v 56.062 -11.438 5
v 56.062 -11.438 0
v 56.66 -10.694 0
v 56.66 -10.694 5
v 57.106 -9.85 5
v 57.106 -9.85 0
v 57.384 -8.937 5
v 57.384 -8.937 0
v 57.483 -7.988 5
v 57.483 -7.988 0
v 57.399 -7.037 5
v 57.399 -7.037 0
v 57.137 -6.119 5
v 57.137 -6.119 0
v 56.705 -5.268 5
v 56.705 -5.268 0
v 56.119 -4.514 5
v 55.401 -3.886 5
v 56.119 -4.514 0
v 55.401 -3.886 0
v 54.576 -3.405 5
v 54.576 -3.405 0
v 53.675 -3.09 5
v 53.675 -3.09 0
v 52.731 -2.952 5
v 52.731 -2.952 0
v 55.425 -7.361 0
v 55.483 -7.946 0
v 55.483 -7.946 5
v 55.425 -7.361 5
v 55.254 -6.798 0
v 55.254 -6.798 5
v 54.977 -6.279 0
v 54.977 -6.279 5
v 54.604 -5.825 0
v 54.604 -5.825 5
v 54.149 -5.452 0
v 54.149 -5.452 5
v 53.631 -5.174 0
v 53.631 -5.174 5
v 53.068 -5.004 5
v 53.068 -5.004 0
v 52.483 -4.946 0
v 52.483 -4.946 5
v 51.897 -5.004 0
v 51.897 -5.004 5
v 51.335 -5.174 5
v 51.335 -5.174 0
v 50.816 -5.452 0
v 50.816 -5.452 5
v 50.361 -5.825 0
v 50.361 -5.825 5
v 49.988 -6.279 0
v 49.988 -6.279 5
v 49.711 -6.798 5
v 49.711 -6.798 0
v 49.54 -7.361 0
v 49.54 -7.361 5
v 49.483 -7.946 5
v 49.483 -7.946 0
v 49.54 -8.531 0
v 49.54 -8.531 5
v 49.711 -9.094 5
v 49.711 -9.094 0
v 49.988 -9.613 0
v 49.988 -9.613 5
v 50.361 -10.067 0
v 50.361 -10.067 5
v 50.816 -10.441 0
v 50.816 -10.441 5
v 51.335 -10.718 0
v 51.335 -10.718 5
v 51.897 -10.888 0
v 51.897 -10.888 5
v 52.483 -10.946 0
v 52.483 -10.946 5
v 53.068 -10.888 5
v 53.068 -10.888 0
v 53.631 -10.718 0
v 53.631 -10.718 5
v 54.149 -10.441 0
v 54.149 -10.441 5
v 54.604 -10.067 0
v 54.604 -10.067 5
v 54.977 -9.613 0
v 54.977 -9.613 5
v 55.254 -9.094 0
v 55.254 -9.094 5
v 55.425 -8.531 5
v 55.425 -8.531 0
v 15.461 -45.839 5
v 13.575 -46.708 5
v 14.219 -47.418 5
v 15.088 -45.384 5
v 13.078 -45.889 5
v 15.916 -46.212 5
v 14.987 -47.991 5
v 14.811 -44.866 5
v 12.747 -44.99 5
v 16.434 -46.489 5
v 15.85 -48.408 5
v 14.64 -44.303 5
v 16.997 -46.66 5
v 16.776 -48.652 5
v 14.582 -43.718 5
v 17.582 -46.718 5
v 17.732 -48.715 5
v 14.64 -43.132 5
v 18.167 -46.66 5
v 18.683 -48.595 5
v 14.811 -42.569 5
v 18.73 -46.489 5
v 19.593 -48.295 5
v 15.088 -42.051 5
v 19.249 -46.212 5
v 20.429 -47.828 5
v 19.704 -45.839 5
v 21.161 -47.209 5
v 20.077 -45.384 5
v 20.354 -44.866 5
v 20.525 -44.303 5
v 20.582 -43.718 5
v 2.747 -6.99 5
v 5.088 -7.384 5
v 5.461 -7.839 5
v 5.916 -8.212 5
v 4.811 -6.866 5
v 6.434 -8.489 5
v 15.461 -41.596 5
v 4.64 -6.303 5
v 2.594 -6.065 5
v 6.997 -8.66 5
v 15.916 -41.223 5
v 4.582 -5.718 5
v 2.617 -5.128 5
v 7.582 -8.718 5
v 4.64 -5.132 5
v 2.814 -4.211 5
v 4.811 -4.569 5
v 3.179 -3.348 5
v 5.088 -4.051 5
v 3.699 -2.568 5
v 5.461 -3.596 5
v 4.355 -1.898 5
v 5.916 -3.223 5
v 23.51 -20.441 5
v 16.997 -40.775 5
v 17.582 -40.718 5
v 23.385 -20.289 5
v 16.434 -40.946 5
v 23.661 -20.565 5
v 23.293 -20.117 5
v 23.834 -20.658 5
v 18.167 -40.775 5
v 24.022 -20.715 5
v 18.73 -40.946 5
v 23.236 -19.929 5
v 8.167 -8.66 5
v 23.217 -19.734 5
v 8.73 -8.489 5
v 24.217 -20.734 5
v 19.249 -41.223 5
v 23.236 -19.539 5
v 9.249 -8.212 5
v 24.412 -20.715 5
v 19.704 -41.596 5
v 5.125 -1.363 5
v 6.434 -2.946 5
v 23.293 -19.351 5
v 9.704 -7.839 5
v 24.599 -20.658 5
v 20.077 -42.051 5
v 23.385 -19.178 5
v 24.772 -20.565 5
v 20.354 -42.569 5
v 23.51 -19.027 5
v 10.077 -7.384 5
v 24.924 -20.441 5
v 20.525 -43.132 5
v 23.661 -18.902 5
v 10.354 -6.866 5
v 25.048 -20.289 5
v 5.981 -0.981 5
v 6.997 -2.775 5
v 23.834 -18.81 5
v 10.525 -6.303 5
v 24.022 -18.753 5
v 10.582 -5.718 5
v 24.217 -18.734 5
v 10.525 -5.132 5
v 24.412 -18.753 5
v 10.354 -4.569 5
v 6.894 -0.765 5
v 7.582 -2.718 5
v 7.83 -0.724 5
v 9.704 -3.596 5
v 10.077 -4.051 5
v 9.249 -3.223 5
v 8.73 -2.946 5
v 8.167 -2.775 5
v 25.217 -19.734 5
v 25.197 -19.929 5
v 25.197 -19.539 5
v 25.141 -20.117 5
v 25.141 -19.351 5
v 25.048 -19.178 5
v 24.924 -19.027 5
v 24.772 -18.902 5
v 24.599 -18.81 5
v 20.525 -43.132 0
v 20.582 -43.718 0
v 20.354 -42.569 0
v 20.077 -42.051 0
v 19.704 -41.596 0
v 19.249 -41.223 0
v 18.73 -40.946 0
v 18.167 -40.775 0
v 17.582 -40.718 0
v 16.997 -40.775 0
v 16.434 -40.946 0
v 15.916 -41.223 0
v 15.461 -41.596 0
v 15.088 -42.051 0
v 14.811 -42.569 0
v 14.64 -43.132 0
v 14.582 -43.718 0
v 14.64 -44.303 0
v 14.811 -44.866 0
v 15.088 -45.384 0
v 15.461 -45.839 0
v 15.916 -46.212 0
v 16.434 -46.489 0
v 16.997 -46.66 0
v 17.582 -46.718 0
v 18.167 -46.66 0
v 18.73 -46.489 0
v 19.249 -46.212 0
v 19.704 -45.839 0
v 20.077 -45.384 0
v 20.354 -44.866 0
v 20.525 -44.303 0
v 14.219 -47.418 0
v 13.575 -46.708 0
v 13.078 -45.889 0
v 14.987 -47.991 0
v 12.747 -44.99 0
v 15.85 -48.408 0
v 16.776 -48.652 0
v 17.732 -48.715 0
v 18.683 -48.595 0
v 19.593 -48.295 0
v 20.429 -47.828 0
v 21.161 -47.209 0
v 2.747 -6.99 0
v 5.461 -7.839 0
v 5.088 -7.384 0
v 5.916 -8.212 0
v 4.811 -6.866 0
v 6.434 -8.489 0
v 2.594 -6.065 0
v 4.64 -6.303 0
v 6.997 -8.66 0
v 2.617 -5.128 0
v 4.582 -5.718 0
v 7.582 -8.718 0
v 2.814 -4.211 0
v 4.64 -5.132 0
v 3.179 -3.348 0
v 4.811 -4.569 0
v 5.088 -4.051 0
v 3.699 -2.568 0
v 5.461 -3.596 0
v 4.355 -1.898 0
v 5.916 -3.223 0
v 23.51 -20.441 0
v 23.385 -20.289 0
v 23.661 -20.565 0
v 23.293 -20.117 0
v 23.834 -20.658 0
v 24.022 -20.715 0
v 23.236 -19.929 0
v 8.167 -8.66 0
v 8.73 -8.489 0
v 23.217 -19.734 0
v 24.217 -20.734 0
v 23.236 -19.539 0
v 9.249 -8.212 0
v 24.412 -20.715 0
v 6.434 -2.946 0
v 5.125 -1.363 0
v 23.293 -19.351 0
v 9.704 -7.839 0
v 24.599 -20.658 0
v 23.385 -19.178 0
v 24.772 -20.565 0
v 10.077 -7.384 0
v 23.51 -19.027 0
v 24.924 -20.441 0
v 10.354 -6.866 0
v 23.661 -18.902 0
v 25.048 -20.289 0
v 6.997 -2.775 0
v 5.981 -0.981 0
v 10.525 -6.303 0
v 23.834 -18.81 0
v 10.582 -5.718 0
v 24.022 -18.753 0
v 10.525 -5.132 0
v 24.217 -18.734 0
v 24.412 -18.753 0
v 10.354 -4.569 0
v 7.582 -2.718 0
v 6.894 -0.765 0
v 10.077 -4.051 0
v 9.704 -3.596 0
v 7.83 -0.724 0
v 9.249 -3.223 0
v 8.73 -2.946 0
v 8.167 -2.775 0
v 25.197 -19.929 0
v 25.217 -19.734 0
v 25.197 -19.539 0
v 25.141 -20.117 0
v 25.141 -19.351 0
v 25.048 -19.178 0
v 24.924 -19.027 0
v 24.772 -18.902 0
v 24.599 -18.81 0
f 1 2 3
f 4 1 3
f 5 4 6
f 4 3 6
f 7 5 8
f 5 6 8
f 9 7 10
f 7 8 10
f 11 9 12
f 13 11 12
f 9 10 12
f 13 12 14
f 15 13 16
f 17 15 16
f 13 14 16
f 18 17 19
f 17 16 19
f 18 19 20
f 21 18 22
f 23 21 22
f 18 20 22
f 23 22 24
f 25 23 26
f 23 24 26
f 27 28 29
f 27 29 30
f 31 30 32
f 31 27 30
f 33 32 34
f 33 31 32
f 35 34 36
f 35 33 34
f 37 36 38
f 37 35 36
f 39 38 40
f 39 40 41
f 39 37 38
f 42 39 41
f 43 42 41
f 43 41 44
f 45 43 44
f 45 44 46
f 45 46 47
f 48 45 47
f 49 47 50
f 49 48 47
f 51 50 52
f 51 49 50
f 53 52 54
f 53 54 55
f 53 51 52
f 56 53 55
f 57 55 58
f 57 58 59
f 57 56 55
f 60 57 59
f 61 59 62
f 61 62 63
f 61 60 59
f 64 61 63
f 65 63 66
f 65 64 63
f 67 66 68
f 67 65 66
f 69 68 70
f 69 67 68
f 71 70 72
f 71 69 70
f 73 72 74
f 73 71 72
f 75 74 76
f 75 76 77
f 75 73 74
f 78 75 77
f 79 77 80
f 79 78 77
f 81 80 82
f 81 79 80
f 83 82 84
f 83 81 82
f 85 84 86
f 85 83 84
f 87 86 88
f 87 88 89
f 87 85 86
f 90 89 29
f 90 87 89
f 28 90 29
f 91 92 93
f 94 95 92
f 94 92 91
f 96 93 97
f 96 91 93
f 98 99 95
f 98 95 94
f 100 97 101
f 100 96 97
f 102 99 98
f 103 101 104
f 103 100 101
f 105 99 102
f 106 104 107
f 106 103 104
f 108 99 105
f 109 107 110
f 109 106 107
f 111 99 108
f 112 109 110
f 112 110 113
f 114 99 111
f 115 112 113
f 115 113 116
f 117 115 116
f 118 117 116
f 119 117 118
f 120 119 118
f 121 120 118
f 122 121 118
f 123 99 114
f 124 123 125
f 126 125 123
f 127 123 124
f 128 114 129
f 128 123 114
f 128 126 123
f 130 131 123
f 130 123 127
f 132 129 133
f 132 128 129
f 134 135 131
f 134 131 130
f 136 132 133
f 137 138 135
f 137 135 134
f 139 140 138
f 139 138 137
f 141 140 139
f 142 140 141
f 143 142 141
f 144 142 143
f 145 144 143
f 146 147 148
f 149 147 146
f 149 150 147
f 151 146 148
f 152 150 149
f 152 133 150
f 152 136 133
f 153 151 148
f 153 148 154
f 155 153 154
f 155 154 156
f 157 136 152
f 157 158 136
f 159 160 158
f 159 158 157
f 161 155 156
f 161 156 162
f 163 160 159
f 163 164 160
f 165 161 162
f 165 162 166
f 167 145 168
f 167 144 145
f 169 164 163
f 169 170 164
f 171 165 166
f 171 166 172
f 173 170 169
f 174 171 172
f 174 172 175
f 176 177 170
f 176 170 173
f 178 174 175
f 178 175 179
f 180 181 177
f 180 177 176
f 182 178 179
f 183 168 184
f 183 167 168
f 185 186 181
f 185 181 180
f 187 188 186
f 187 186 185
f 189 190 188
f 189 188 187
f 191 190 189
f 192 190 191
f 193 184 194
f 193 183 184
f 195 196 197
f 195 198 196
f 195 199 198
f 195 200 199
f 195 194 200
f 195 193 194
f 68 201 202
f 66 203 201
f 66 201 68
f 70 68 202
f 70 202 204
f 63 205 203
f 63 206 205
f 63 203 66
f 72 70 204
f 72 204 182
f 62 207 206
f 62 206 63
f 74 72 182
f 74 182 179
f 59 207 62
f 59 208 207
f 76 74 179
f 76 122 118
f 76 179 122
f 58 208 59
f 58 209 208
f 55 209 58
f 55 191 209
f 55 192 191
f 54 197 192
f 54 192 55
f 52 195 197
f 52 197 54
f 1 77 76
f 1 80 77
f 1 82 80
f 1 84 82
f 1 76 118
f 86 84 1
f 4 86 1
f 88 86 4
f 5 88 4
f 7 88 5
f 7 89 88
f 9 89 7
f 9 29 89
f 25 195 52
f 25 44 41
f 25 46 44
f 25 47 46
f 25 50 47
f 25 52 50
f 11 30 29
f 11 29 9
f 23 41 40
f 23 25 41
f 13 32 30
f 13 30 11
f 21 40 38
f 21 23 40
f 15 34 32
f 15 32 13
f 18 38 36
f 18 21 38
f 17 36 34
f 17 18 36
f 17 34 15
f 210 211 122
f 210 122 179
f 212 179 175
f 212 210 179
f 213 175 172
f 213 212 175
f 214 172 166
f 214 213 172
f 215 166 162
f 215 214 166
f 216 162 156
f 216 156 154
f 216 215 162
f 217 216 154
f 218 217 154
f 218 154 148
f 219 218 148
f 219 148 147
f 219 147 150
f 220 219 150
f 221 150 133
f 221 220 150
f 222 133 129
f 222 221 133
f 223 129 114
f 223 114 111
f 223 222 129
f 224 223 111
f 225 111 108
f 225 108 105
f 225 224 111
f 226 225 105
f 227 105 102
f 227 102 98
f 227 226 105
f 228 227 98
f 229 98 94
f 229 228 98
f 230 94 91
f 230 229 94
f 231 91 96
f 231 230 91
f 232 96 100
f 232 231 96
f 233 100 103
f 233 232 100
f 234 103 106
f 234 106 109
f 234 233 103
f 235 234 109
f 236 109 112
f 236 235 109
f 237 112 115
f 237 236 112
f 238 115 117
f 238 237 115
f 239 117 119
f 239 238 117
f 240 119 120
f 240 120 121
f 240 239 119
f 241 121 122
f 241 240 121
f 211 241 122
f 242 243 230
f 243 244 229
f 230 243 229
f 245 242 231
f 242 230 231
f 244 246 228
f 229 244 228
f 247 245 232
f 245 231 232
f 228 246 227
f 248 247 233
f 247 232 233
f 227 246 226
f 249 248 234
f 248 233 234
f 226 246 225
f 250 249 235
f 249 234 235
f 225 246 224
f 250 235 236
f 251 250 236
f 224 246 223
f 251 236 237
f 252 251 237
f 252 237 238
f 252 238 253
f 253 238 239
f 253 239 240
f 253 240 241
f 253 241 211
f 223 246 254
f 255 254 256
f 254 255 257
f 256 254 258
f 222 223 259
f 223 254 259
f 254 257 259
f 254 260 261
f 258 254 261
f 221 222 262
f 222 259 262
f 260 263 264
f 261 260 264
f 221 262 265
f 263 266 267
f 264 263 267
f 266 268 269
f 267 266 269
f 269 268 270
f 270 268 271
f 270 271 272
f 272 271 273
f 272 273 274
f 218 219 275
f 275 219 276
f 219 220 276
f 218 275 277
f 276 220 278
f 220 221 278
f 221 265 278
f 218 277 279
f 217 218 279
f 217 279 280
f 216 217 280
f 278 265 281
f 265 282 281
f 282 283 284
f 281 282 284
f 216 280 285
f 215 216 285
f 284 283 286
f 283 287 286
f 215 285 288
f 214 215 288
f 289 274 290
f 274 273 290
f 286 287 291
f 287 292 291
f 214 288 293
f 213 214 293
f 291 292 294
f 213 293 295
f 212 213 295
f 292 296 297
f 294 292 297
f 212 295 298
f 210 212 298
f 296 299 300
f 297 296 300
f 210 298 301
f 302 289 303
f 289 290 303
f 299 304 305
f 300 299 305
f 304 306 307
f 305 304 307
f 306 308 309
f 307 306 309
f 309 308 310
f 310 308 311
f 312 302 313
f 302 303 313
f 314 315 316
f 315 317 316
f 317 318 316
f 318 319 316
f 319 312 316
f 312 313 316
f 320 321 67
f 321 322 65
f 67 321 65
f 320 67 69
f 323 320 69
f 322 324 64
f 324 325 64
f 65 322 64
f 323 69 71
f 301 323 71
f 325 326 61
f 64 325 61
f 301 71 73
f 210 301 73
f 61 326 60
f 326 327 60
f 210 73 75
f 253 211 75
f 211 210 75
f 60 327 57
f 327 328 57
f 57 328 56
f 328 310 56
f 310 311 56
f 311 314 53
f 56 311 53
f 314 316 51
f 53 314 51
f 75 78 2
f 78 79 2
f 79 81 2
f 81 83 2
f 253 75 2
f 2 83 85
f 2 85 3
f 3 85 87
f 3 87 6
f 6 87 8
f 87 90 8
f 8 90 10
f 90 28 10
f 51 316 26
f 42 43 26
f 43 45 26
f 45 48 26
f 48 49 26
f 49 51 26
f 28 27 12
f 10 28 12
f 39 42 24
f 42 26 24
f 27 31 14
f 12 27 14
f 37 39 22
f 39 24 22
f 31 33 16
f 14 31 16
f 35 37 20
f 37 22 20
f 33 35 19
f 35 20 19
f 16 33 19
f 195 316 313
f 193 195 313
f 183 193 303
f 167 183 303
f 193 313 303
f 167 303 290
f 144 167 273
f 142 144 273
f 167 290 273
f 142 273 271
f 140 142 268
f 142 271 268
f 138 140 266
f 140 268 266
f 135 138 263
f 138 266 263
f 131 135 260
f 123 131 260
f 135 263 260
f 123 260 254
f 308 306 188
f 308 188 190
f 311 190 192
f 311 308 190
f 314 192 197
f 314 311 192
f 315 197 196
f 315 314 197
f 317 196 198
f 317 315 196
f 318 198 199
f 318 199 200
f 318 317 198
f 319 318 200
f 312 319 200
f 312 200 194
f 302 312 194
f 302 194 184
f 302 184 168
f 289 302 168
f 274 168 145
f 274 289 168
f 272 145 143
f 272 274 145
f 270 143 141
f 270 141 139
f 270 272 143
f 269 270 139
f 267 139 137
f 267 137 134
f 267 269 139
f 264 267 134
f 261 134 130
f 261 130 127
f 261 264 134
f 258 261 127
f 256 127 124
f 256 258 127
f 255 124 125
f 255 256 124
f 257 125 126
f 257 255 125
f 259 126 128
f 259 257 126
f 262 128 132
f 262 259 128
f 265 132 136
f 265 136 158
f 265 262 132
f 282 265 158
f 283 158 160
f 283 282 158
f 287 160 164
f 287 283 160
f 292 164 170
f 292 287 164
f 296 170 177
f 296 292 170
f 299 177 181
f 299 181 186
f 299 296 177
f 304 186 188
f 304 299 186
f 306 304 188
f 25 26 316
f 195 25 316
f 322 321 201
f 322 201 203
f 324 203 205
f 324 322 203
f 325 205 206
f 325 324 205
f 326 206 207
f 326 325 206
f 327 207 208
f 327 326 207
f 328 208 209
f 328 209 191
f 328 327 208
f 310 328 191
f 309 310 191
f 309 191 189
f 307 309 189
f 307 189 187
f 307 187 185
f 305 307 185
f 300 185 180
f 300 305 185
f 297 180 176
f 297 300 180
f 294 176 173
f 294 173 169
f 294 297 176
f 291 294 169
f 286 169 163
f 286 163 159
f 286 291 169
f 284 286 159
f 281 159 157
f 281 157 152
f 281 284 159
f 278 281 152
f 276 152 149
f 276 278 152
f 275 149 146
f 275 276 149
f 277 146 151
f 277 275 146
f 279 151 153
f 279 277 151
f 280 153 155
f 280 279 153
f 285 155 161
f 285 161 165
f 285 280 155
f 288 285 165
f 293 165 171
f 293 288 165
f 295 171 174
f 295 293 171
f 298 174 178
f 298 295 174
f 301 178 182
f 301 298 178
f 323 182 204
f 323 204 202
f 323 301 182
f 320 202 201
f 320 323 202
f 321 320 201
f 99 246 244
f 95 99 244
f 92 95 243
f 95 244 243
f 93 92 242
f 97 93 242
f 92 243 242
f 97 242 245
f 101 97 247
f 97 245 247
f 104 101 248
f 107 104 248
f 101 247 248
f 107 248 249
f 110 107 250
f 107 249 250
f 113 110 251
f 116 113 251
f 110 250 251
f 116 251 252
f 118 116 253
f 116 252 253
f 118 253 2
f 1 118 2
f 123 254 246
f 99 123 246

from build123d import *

# Parameters (mm, degrees)
ESQUISSE1_R      = 3
ESQUISSE1_R_2    = 1
EXTRUSION1_DEPTH = 5


with BuildPart() as part:
    # Esquisse1 → Extrusion1 (new body)
    with BuildSketch(Plane.XY):
        with BuildLine():
            Line((52.730599116, -2.952254244), (7.830086245, -0.723670796))
            ThreePointArc((7.830086245, -0.723670796), (3.699182558, -2.567602385), (2.746849637, -6.989989861))
            Line((2.746849637, -6.989989861), (12.746849637, -44.989989861))
            ThreePointArc((12.746849637, -44.989989861), (16.307085805, -48.552192625), (21.161053557, -47.209223095))
            Line((21.161053557, -47.209223095), (56.061566429, -11.437806542))
            ThreePointArc((56.061566429, -11.437806542), (57.136985769, -6.119100628), (52.730599116, -2.952254244))
        make_face()
        with Locations((7.582222324, -5.717523364)):
            Circle(ESQUISSE1_R, mode=Mode.SUBTRACT)
        with Locations((52.482735195, -7.946106812)):
            Circle(ESQUISSE1_R, mode=Mode.SUBTRACT)
        with Locations((17.582222324, -43.717523364)):
            Circle(ESQUISSE1_R, mode=Mode.SUBTRACT)
        with Locations((24.216673772, -19.733908354)):
            Circle(ESQUISSE1_R_2, mode=Mode.SUBTRACT)
    extrude(amount=EXTRUSION1_DEPTH)


solid = part.part
